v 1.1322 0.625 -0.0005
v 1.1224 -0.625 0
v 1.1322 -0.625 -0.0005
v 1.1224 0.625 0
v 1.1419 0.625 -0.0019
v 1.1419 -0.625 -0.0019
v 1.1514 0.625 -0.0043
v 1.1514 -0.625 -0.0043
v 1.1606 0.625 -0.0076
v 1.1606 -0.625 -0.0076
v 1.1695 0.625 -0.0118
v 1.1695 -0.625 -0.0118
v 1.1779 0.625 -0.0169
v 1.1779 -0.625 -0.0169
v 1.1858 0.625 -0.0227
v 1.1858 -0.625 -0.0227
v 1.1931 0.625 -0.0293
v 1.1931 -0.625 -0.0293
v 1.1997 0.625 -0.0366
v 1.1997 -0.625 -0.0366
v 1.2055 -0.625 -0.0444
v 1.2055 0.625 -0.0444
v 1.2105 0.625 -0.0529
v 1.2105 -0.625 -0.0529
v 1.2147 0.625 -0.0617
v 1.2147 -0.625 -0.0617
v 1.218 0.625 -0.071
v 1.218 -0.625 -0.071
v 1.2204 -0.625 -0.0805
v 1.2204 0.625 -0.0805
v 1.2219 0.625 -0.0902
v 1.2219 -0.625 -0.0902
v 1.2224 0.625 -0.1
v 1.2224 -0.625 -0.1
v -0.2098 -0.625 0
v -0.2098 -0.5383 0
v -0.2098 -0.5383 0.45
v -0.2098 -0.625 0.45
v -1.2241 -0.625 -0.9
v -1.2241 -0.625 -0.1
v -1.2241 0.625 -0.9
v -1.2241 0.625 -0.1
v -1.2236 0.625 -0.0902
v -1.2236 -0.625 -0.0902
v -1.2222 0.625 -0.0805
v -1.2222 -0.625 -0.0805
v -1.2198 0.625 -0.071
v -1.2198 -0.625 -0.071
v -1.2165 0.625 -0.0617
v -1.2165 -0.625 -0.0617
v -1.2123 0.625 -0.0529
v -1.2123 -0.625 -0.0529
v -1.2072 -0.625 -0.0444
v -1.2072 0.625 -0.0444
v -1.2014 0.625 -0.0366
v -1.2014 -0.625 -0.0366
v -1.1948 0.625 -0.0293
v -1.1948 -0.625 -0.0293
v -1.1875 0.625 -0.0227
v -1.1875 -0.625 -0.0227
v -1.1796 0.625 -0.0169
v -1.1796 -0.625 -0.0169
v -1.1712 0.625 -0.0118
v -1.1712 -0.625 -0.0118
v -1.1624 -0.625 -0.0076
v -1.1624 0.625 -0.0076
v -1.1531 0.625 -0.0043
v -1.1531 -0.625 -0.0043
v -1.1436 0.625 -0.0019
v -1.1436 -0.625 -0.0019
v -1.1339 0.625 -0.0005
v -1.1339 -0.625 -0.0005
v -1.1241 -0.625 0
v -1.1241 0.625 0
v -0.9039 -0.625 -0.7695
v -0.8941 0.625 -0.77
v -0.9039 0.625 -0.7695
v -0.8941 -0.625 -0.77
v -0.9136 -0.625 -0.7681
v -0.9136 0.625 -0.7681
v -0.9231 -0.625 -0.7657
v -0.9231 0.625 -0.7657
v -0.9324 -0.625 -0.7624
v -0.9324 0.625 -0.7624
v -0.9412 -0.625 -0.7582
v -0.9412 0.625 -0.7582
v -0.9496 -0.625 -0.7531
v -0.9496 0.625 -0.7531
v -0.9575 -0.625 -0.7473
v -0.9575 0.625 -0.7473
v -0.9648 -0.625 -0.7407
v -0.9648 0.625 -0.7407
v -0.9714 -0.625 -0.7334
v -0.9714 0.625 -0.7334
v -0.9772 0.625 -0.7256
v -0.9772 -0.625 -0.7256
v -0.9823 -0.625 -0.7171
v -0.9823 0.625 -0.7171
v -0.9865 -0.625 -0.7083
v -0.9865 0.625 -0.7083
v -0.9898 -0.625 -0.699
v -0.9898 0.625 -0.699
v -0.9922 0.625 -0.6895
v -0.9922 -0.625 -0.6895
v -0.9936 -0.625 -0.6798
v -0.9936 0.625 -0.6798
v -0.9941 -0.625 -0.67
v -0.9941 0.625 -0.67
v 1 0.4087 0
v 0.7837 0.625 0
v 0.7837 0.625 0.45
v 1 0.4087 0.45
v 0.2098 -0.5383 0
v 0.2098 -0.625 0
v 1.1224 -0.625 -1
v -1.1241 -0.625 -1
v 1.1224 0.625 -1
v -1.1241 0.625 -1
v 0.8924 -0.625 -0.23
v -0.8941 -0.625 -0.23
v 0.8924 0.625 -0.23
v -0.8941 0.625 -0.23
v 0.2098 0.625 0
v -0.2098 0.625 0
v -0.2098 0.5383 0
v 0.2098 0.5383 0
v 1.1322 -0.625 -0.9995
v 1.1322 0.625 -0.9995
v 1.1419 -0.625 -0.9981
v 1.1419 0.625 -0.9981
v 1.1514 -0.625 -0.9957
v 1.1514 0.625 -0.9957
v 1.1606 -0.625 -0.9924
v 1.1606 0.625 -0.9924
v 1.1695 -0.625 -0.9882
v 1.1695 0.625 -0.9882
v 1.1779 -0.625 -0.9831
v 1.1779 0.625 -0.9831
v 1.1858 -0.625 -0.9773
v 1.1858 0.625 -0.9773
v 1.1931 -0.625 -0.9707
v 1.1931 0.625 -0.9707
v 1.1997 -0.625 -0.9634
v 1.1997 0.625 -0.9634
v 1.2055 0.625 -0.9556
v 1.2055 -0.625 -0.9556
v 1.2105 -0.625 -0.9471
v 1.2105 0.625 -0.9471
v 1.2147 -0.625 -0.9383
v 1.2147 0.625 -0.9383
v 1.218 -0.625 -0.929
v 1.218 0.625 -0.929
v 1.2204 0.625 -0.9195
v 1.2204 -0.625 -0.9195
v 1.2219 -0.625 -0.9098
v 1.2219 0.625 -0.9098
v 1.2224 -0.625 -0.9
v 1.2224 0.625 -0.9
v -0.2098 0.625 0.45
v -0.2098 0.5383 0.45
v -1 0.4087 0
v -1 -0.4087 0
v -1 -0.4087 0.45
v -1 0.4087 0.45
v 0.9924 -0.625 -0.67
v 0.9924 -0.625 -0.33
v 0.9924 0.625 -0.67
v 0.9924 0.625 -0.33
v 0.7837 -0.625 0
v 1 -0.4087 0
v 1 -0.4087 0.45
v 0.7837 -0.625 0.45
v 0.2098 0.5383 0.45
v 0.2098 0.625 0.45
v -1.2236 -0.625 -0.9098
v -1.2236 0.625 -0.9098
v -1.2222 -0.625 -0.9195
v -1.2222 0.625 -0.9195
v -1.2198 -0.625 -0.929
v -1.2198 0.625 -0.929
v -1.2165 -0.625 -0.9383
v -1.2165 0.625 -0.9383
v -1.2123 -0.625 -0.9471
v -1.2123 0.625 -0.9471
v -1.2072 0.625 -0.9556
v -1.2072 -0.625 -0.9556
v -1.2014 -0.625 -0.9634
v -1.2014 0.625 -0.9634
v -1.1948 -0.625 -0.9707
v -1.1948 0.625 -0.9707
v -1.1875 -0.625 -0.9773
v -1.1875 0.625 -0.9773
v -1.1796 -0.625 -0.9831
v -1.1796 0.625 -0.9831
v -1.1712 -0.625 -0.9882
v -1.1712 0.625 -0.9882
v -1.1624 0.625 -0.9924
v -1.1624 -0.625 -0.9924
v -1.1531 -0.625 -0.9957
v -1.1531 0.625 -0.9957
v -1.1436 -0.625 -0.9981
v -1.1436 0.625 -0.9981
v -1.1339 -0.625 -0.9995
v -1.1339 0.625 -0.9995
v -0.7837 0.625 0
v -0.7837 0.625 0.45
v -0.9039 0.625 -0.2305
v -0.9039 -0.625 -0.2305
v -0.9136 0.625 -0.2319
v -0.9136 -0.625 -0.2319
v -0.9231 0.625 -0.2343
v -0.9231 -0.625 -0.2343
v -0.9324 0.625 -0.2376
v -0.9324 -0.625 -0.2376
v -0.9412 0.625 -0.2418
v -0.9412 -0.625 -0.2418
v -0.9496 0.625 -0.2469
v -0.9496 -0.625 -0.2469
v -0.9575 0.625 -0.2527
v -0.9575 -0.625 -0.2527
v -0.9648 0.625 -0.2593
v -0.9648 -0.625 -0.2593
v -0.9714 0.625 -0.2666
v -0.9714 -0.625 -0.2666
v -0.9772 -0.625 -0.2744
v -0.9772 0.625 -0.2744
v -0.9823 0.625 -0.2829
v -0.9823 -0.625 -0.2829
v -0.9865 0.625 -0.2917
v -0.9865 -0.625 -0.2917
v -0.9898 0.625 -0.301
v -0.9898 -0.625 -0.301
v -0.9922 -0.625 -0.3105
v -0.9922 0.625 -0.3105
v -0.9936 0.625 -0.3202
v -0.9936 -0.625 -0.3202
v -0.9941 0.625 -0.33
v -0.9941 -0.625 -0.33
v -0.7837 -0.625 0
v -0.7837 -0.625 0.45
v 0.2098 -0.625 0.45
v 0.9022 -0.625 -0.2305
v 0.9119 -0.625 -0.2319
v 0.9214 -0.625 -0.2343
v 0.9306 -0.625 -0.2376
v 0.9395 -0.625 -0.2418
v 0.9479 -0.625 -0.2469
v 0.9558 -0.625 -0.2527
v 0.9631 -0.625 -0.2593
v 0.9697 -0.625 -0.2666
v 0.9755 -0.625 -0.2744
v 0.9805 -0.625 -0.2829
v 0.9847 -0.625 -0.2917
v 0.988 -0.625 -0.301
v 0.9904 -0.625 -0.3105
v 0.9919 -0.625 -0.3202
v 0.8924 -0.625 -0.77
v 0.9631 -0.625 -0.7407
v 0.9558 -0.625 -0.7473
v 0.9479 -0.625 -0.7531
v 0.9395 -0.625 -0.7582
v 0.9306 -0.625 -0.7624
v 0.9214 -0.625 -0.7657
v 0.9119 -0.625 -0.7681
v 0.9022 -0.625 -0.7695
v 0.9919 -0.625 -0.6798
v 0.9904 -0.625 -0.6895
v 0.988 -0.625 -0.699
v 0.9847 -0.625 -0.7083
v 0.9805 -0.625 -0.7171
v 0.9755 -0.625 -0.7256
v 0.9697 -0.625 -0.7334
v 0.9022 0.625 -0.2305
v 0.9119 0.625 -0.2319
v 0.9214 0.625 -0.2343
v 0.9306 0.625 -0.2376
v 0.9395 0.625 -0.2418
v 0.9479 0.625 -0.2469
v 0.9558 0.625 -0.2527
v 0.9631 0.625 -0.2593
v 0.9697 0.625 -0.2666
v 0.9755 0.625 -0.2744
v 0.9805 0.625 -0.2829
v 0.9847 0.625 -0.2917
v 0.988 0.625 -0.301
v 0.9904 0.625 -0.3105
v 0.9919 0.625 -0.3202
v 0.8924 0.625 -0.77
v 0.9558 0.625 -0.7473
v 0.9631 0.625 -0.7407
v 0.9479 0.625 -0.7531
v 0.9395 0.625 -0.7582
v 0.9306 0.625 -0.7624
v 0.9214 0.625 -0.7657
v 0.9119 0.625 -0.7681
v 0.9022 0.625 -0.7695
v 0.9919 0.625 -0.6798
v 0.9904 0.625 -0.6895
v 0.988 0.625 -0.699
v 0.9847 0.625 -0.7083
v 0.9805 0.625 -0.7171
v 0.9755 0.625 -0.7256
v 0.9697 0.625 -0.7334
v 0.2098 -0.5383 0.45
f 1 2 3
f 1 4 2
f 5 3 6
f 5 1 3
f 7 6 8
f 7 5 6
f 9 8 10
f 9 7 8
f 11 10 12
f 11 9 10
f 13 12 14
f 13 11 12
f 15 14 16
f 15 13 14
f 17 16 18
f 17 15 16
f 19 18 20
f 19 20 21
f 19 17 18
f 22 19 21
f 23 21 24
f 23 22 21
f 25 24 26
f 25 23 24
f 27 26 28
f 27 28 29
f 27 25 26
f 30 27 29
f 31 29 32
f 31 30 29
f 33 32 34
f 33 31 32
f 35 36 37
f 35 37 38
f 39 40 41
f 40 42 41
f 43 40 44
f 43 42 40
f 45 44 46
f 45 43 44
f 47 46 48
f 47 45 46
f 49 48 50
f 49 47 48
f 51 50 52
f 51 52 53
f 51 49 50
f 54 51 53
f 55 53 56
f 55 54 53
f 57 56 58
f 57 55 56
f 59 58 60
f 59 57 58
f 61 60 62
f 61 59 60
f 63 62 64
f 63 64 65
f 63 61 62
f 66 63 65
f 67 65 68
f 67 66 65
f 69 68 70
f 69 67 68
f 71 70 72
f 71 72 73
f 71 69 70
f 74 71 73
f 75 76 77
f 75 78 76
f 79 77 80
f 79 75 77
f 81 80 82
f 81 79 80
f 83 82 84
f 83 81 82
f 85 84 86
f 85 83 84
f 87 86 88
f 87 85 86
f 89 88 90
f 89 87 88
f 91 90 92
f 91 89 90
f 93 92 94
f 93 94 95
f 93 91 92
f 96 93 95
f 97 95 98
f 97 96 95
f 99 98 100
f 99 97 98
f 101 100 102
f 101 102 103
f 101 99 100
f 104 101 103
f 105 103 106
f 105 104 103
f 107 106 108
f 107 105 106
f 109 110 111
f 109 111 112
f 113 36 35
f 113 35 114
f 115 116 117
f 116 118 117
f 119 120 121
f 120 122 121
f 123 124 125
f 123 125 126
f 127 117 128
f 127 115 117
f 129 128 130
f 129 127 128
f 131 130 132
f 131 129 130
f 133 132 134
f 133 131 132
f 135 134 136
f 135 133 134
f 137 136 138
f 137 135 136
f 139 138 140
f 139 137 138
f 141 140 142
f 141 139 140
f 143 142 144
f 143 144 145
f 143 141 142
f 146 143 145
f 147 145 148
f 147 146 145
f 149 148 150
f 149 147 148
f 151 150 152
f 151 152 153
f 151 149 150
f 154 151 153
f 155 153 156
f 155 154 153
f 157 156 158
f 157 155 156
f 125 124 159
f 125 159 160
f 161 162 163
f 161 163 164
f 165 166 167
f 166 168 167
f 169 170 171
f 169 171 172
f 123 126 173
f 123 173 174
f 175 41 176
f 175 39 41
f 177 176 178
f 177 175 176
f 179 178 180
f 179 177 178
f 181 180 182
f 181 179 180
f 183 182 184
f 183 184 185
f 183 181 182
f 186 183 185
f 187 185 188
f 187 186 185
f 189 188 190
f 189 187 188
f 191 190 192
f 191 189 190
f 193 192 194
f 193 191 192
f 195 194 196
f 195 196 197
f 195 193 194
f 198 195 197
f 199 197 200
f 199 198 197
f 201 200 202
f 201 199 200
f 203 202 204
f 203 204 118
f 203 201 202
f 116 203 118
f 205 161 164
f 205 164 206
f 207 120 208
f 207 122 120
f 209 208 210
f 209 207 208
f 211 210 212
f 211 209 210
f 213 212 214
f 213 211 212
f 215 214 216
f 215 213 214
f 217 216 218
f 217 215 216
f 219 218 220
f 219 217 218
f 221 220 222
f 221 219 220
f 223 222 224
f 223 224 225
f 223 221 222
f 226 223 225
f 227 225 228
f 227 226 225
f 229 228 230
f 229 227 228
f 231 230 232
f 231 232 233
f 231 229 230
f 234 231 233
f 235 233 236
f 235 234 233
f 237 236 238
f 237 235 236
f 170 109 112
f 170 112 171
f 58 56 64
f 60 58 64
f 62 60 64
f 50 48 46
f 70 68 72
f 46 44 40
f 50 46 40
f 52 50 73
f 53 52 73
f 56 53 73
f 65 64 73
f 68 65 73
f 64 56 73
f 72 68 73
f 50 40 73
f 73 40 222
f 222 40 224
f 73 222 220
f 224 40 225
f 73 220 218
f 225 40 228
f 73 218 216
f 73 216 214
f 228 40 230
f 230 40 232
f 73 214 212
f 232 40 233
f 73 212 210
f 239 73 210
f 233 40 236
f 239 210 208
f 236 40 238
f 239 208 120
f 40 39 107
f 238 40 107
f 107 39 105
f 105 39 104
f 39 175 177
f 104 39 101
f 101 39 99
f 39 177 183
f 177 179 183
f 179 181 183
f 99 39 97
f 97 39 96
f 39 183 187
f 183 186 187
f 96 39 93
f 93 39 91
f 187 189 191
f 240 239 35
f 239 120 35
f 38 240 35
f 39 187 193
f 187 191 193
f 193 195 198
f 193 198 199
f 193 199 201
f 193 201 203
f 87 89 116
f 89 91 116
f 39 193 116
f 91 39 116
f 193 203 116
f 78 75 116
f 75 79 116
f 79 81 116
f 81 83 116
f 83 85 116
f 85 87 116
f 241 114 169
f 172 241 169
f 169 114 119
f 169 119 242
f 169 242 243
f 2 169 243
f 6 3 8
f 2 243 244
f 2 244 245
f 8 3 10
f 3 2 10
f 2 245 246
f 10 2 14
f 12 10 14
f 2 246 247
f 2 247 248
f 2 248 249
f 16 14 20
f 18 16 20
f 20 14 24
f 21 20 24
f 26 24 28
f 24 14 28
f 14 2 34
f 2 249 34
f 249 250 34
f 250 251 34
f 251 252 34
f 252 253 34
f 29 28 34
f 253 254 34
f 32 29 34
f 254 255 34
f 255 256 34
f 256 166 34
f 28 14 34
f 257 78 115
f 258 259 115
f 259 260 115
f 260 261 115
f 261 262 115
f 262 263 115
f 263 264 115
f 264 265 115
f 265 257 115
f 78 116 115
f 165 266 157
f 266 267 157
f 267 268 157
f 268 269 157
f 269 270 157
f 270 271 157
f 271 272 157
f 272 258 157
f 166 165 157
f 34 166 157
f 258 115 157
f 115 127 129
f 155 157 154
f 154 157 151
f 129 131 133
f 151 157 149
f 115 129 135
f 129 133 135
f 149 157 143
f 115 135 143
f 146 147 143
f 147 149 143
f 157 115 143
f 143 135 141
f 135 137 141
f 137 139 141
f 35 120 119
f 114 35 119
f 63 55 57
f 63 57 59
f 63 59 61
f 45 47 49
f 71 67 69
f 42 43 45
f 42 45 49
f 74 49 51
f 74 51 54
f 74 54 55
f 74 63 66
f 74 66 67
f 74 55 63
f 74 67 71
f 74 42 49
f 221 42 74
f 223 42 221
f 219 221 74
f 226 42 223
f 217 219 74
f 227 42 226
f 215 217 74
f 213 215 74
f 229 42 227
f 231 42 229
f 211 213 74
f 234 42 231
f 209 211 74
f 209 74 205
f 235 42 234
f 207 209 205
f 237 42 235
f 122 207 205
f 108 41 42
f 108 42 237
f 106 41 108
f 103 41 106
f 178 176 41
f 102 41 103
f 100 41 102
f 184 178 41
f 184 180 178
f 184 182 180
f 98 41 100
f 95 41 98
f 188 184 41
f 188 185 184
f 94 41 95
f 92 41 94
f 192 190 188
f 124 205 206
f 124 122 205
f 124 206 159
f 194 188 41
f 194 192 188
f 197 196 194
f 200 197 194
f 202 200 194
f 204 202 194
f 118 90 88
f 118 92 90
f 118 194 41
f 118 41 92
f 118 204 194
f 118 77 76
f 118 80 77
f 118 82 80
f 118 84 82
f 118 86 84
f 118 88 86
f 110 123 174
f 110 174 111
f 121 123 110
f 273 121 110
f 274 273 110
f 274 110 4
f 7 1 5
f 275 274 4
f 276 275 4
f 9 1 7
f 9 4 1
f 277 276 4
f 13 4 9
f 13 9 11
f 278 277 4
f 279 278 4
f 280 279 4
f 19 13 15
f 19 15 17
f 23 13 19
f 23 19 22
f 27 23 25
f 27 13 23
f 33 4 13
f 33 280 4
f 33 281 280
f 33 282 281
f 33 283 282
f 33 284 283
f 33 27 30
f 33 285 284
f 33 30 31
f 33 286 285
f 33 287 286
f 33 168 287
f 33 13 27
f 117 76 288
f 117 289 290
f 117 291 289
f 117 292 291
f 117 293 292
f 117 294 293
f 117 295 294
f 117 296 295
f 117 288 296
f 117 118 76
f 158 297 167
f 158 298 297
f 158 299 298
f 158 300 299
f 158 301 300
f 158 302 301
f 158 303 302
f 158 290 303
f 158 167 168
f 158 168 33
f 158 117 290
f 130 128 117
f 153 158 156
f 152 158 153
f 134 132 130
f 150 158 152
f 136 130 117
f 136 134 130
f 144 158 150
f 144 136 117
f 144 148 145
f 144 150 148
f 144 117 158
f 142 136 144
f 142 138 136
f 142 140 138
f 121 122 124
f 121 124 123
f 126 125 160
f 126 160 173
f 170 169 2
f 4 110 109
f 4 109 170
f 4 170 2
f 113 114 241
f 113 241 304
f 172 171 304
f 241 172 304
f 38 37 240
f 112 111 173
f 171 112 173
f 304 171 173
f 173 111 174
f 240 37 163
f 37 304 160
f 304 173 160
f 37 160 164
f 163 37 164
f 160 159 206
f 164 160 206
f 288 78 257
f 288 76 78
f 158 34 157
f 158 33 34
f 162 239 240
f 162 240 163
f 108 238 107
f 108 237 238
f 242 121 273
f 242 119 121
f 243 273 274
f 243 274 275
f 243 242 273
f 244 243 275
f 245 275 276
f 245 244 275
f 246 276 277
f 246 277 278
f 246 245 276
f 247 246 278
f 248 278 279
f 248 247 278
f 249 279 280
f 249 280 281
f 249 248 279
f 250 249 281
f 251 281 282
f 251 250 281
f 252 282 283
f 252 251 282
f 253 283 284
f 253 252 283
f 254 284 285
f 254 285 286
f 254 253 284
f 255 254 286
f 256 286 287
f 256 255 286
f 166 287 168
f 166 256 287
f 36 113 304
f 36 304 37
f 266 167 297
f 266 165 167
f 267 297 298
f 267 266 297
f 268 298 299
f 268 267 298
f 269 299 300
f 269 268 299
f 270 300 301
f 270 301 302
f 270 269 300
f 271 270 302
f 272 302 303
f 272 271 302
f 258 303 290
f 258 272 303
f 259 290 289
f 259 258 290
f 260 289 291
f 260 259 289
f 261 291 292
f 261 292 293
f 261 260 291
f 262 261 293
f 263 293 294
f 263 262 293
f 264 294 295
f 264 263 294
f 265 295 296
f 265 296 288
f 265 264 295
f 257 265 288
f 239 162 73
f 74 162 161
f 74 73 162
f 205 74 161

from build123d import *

# Parameters (mm, degrees)
BOSS_EXTRUDE1_DEPTH = 0.45
SKETCH3_W           = 2.44643867
SKETCH3_H           = 1
SKETCH3_W_2         = 1.98643867
SKETCH3_H_2         = 0.54
BOSS_EXTRUDE2_DEPTH = 0.625
FILLET1_R           = 0.1


with BuildPart() as part:
    # Sketch2 → Boss-Extrude1 (new body)
    with BuildSketch(Plane.XY):
        Polygon((-1, -0.408686365), (-1, 0.408686365), (-0.783686365, 0.625), (-0.209757083, 0.625), (-0.209757083, 0.53827251), (0.209757083, 0.53827251), (0.209757083, 0.625), (0.783686365, 0.625), (1, 0.408686365), (1, -0.408686365), (0.783686365, -0.625), (0.209757083, -0.625), (0.209757083, -0.53827251), (-0.209757083, -0.53827251), (-0.209757083, -0.625), (-0.783686365, -0.625), align=None)
    extrude(amount=BOSS_EXTRUDE1_DEPTH)

    # Sketch3 → Boss-Extrude2 (add, symmetric)
    with BuildSketch(Plane(origin=(0, 0, 0), x_dir=(1, 0, 0), z_dir=(0, 1, 0))):
        with Locations((-0.000865872, 0.5)):
            Rectangle(SKETCH3_W, SKETCH3_H)
        with Locations((-0.000865872, 0.5)):
            Rectangle(SKETCH3_W_2, SKETCH3_H_2, mode=Mode.SUBTRACT)
    extrude(amount=BOSS_EXTRUDE2_DEPTH, both=True)

    # Fillet1
    fillet1_edges = [part.edges().sort_by_distance(p)[0] for p in [
        (-1.224085207, 0, 0),
        (1.222353463, 0, 0),
        (1.222353463, 0, -1),
        (-1.224085207, 0, -1),
        (0.992353463, 0, -0.77),
        (-0.994085207, 0, -0.77),
        (-0.994085207, 0, -0.23),
        (0.992353463, 0, -0.23),
    ]]
    fillet(fillet1_edges, radius=FILLET1_R)


solid = part.part
